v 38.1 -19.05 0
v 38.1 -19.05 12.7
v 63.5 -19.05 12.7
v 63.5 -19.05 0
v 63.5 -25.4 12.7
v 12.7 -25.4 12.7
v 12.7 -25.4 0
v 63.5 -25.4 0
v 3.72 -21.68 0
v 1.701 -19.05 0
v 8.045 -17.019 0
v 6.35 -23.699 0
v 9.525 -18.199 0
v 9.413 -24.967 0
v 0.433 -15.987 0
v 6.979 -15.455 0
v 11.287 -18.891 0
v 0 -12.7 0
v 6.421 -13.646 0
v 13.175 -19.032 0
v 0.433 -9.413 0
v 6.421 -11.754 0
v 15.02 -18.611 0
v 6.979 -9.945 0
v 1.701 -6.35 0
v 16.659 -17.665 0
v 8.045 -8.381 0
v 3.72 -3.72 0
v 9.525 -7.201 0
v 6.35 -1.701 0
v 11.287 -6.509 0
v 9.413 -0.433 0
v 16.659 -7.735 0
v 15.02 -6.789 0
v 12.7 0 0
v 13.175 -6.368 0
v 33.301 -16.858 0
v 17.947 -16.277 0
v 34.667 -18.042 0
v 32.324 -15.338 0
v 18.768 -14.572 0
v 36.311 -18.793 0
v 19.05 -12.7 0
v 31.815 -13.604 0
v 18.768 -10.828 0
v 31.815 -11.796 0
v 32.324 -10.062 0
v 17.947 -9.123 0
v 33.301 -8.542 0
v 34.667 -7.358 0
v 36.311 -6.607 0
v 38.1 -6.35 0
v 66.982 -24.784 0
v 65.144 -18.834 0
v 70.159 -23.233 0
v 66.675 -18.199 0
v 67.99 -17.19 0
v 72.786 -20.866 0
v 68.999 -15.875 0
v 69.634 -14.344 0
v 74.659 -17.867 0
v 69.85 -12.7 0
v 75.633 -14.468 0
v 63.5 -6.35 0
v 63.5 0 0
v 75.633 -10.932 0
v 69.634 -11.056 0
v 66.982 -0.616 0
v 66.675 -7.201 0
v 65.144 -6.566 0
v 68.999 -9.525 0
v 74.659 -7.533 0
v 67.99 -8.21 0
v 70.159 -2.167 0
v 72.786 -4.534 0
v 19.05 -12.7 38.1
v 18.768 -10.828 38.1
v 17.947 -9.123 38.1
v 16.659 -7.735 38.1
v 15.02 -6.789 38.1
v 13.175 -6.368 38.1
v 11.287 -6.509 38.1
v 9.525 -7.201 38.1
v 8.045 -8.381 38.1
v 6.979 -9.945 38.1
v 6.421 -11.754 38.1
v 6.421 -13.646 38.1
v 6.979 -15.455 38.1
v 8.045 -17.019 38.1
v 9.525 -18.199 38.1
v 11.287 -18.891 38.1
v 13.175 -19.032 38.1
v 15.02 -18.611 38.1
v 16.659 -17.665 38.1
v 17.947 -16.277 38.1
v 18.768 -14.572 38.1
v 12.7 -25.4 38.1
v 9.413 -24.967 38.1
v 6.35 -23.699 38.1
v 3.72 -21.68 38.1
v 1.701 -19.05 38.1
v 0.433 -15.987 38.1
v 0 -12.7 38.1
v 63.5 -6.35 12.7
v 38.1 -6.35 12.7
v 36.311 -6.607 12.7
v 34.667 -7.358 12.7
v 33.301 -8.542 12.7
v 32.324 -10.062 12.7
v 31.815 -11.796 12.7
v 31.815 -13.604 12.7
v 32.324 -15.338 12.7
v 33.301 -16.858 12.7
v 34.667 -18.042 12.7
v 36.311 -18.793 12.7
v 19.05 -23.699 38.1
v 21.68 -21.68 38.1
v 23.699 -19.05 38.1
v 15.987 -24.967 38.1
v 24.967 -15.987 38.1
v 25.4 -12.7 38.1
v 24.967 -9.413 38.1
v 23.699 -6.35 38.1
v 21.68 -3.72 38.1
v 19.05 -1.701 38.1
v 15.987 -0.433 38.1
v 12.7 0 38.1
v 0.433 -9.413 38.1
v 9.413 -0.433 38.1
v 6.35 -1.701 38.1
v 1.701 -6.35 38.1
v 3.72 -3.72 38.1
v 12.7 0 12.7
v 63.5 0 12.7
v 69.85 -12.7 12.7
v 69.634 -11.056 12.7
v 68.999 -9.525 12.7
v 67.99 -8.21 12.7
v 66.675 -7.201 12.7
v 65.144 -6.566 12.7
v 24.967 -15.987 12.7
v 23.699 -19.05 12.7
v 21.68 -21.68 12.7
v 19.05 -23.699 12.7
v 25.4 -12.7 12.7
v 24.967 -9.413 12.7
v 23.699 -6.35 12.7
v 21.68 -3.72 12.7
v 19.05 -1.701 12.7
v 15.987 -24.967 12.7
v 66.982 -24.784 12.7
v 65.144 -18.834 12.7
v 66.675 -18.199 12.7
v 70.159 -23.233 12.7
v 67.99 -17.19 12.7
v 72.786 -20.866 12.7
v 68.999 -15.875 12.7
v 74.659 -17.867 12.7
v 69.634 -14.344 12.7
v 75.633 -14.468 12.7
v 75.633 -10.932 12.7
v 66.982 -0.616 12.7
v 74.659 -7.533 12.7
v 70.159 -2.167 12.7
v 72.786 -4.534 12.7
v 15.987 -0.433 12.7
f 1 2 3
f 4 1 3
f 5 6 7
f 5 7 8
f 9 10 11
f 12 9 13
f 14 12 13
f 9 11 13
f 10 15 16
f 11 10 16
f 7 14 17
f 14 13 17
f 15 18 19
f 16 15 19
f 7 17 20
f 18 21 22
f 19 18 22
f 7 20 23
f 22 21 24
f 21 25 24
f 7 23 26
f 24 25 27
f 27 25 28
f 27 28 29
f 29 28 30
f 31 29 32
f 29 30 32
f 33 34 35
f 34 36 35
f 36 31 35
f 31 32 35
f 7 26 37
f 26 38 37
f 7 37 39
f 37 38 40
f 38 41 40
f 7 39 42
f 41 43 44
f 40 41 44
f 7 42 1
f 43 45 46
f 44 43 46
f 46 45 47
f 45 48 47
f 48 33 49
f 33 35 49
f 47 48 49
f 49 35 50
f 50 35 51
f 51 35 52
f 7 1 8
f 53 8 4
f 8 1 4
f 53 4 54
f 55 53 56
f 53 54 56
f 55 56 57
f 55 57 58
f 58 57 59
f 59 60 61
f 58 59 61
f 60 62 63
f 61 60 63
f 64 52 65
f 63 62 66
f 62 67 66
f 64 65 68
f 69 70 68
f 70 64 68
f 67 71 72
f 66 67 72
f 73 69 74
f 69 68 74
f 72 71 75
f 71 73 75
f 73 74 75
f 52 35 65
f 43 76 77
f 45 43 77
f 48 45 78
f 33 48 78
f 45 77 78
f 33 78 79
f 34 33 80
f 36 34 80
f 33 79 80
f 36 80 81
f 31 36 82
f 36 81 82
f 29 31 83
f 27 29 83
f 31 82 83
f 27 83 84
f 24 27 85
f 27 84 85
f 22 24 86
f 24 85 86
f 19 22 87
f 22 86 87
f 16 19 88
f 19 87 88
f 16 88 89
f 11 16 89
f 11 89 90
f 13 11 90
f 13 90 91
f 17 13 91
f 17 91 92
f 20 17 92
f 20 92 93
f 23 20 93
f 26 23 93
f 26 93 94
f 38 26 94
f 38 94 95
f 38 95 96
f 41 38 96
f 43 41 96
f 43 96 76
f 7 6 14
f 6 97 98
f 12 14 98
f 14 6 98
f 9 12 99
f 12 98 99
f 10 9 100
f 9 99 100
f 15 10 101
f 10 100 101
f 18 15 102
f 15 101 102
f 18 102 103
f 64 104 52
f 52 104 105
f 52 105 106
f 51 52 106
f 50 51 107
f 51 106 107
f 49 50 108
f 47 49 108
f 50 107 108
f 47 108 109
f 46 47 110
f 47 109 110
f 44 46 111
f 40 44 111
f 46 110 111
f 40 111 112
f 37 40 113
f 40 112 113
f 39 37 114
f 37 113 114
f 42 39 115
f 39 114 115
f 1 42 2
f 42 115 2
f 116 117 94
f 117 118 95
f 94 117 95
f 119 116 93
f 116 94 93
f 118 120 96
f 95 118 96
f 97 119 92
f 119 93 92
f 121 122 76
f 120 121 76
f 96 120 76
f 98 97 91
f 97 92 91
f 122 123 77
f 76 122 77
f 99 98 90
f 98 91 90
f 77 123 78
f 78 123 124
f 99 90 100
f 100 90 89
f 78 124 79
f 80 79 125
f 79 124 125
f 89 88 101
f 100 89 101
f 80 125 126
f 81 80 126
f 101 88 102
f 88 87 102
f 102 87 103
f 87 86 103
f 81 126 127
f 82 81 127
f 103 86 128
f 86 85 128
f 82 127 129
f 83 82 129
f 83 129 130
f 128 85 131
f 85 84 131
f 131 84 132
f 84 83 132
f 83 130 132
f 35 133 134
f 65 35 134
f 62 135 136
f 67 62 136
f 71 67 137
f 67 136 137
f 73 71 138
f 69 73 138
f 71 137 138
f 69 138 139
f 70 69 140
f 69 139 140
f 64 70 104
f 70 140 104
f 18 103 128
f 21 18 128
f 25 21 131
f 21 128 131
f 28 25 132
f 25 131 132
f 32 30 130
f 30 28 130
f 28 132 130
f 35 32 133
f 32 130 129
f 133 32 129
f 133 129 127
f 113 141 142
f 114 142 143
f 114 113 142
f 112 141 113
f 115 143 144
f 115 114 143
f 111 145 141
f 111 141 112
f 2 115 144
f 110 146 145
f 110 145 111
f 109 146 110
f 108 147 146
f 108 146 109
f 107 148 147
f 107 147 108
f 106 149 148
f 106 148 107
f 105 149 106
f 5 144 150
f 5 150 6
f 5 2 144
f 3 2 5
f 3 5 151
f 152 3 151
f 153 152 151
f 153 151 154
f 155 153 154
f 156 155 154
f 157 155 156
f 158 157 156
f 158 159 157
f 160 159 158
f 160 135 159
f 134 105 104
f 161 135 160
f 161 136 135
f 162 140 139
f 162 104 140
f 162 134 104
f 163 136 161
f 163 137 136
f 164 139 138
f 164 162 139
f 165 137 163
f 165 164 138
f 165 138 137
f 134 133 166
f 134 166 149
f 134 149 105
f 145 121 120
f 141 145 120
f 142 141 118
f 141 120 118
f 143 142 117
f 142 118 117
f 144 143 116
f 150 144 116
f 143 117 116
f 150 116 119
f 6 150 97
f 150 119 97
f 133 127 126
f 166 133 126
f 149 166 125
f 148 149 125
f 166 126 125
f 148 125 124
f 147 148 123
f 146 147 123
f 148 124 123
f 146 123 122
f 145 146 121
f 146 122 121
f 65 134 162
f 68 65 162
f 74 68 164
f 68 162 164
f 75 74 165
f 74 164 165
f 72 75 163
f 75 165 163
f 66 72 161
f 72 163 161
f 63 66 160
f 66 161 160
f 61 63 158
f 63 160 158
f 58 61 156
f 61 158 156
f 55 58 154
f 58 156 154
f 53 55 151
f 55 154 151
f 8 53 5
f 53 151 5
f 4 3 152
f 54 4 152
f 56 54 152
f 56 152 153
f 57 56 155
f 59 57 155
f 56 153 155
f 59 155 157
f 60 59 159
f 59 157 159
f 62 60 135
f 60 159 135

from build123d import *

# Parameters (mm, degrees)
F1_DEPTH = 25.4
F3_DEPTH = 12.701
F5_DEPTH = 38.101
F7_DEPTH = 25.4


with BuildPart() as f1:
    # F0 (on Front) → F1 (new body)
    with BuildSketch(Plane.XZ):
        Polygon((0, 38.1), (0, 0), (76.2, 0), (76.2, 12.7), (25.4, 12.7), (25.4, 38.1), align=None)
    extrude(amount=F1_DEPTH)

    # F2 (on face) → F3 (cut, through all)
    with BuildSketch(Plane.XY.offset(12.7)):
        with BuildLine():
            Line((76.2, 0), (63.5, 0))
            ThreePointArc((63.5, 0), (75.756906611, -12.7), (63.5, -25.4))
            Line((63.5, -25.4), (76.2, -25.4))
            Line((76.2, -25.4), (76.2, 0))
        make_face()
        with BuildLine():
            ThreePointArc((69.85, -12.7), (67.9901280605, -8.2098719395), (63.5, -6.35))
            Line((63.5, -6.35), (63.5, -19.05))
            ThreePointArc((63.5, -19.05), (67.9901280605, -17.1901280605), (69.85, -12.7))
        make_face()
        with BuildLine():
            Line((63.5, -19.05), (63.5, -6.35))
            ThreePointArc((63.5, -6.35), (57.15, -12.7), (63.5, -19.05))
        make_face()
        with BuildLine():
            ThreePointArc((63.5, -19.05), (57.15, -12.7), (63.5, -6.35))
            Line((63.5, -6.35), (38.1, -6.35))
            ThreePointArc((38.1, -6.35), (42.5901280605, -8.2098719395), (44.45, -12.7))
            ThreePointArc((44.45, -12.7), (42.5901280605, -17.1901280605), (38.1, -19.05))
            Line((38.1, -19.05), (63.5, -19.05))
        make_face()
        with BuildLine():
            Line((38.1, -19.05), (38.1, -6.35))
            ThreePointArc((38.1, -6.35), (31.75, -12.7), (38.1, -19.05))
        make_face()
        with BuildLine():
            ThreePointArc((44.45, -12.7), (42.5901280605, -8.2098719395), (38.1, -6.35))
            Line((38.1, -6.35), (38.1, -19.05))
            ThreePointArc((38.1, -19.05), (42.5901280605, -17.1901280605), (44.45, -12.7))
        make_face()
    extrude(amount=-F3_DEPTH, mode=Mode.SUBTRACT)

    # F4 (on face) → F5 (cut, through all)
    with BuildSketch(Plane.XY.offset(38.1)):
        with BuildLine():
            ThreePointArc((0, -12.7), (3.7197438789, -3.7197438789), (12.7, 0))
            Line((12.7, 0), (0, 0))
            Line((0, 0), (0, -12.7))
        make_face()
        with BuildLine():
            Line((0, -25.4), (12.7, -25.4))
            ThreePointArc((12.7, -25.4), (3.7197438789, -21.6802561211), (0, -12.7))
            Line((0, -12.7), (0, -25.4))
        make_face()
        with BuildLine():
            ThreePointArc((6.35, -12.7), (12.7, -19.05), (19.05, -12.7))
            Line((19.05, -12.7), (6.35, -12.7))
        make_face()
        with BuildLine():
            Line((6.35, -12.7), (19.05, -12.7))
            ThreePointArc((19.05, -12.7), (12.7, -6.35), (6.35, -12.7))
        make_face()
    extrude(amount=-F5_DEPTH, mode=Mode.SUBTRACT)

    # F6 (on face) → F7 (cut)
    with BuildSketch(Plane.XY.offset(38.1)):
        with BuildLine():
            Line((25.4, -25.4), (25.4, -12.7))
            ThreePointArc((25.4, -12.7), (21.6802561211, -21.6802561211), (12.7, -25.4))
            Line((12.7, -25.4), (25.4, -25.4))
        make_face()
        with BuildLine():
            ThreePointArc((12.7, 0), (21.6802561211, -3.7197438789), (25.4, -12.7))
            Line((25.4, -12.7), (25.4, 0))
            Line((25.4, 0), (12.7, 0))
        make_face()
    extrude(amount=-F7_DEPTH, mode=Mode.SUBTRACT)


solid = f1.part
